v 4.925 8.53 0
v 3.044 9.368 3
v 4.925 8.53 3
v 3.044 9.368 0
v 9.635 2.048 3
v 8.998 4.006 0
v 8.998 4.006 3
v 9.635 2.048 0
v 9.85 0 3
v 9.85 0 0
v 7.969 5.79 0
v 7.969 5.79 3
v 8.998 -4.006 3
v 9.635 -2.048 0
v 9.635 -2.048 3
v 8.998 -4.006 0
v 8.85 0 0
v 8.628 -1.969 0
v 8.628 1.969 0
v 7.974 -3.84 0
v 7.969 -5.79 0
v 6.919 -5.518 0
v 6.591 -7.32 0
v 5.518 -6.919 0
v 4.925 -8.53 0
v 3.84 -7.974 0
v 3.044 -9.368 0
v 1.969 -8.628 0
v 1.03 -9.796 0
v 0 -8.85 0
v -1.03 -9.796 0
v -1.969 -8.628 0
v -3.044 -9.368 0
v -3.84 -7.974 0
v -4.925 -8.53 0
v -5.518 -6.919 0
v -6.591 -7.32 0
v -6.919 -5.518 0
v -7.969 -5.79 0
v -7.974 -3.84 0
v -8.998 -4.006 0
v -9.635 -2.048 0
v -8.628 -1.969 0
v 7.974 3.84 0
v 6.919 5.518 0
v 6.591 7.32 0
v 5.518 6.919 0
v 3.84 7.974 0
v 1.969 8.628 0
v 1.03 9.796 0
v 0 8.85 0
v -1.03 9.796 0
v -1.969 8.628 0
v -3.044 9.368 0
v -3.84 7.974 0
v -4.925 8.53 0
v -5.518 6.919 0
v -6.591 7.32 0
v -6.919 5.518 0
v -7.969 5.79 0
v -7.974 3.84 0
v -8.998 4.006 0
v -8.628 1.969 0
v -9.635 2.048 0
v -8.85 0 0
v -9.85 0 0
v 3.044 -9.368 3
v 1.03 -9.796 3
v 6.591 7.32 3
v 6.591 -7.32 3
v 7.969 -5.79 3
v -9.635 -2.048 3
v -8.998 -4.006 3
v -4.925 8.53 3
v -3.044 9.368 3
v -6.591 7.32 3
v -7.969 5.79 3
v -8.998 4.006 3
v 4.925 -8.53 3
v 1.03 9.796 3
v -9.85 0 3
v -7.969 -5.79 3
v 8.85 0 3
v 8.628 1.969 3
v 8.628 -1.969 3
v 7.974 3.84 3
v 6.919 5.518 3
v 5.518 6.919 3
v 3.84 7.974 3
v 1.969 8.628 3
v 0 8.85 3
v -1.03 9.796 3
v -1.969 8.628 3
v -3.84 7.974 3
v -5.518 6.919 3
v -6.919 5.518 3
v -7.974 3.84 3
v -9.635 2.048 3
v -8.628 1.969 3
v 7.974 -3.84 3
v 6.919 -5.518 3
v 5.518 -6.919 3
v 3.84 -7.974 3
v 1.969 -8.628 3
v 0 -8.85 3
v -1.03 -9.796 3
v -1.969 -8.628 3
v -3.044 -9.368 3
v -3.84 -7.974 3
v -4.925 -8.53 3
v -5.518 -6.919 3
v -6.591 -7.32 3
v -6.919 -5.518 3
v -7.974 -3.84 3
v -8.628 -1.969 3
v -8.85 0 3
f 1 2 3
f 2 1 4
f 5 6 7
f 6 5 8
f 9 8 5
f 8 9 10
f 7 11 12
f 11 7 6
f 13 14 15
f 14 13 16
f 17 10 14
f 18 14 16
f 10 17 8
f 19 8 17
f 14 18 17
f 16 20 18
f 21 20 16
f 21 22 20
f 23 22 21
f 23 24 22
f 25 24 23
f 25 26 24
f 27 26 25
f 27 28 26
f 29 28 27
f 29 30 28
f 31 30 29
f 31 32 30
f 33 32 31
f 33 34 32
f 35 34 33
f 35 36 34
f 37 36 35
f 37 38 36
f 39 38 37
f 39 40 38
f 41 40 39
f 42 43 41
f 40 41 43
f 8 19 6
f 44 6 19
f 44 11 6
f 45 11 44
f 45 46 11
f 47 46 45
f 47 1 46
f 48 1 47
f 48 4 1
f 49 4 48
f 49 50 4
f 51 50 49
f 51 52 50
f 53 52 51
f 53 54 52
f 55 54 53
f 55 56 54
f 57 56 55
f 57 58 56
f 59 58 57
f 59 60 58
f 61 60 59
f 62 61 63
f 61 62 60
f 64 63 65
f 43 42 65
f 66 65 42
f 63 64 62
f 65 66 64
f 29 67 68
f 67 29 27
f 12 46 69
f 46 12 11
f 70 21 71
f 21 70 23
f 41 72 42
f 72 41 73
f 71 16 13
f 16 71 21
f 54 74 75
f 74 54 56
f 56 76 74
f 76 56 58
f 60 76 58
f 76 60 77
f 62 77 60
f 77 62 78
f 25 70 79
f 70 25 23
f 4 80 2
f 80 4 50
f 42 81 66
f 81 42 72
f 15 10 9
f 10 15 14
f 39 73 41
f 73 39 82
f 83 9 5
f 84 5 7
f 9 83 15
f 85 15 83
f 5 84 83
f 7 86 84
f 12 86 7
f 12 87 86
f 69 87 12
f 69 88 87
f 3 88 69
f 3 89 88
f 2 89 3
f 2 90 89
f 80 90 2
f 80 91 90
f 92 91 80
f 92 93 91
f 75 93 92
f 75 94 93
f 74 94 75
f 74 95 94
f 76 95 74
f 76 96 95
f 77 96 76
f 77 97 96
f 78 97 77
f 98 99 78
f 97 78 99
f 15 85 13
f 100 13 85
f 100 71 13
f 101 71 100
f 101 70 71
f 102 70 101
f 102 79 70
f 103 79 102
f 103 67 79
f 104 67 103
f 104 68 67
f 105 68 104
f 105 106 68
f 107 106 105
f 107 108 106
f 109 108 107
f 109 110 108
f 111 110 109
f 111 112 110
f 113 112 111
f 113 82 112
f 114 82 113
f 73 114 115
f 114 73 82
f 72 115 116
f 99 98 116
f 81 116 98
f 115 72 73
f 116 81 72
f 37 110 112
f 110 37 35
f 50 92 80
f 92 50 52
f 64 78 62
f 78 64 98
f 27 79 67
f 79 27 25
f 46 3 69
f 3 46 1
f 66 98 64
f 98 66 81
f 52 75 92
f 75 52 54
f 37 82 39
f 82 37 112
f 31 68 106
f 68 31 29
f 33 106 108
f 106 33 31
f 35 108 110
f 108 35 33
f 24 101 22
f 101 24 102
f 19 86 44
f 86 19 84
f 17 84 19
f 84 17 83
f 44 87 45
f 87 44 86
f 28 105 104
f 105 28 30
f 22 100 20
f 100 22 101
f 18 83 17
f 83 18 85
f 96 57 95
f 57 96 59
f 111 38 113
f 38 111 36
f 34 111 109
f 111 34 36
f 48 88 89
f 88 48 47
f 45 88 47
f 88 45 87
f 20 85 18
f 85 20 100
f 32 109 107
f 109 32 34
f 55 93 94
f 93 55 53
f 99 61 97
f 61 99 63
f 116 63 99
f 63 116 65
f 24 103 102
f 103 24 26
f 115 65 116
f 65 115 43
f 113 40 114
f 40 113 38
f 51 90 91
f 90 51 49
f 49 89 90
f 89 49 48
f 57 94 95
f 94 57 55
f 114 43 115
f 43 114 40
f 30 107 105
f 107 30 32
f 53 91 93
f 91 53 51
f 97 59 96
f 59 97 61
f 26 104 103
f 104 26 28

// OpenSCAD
//enter your ring size in mm found in any online conversion chart
RingSize = 17.7;
OD = RingSize + 2;
module ring(){
    difference (){
    cylinder(3,d = OD);
    translate([0,0,-0.5]){    cylinder(4,d = RingSize);
    }
    }
}
ring();
